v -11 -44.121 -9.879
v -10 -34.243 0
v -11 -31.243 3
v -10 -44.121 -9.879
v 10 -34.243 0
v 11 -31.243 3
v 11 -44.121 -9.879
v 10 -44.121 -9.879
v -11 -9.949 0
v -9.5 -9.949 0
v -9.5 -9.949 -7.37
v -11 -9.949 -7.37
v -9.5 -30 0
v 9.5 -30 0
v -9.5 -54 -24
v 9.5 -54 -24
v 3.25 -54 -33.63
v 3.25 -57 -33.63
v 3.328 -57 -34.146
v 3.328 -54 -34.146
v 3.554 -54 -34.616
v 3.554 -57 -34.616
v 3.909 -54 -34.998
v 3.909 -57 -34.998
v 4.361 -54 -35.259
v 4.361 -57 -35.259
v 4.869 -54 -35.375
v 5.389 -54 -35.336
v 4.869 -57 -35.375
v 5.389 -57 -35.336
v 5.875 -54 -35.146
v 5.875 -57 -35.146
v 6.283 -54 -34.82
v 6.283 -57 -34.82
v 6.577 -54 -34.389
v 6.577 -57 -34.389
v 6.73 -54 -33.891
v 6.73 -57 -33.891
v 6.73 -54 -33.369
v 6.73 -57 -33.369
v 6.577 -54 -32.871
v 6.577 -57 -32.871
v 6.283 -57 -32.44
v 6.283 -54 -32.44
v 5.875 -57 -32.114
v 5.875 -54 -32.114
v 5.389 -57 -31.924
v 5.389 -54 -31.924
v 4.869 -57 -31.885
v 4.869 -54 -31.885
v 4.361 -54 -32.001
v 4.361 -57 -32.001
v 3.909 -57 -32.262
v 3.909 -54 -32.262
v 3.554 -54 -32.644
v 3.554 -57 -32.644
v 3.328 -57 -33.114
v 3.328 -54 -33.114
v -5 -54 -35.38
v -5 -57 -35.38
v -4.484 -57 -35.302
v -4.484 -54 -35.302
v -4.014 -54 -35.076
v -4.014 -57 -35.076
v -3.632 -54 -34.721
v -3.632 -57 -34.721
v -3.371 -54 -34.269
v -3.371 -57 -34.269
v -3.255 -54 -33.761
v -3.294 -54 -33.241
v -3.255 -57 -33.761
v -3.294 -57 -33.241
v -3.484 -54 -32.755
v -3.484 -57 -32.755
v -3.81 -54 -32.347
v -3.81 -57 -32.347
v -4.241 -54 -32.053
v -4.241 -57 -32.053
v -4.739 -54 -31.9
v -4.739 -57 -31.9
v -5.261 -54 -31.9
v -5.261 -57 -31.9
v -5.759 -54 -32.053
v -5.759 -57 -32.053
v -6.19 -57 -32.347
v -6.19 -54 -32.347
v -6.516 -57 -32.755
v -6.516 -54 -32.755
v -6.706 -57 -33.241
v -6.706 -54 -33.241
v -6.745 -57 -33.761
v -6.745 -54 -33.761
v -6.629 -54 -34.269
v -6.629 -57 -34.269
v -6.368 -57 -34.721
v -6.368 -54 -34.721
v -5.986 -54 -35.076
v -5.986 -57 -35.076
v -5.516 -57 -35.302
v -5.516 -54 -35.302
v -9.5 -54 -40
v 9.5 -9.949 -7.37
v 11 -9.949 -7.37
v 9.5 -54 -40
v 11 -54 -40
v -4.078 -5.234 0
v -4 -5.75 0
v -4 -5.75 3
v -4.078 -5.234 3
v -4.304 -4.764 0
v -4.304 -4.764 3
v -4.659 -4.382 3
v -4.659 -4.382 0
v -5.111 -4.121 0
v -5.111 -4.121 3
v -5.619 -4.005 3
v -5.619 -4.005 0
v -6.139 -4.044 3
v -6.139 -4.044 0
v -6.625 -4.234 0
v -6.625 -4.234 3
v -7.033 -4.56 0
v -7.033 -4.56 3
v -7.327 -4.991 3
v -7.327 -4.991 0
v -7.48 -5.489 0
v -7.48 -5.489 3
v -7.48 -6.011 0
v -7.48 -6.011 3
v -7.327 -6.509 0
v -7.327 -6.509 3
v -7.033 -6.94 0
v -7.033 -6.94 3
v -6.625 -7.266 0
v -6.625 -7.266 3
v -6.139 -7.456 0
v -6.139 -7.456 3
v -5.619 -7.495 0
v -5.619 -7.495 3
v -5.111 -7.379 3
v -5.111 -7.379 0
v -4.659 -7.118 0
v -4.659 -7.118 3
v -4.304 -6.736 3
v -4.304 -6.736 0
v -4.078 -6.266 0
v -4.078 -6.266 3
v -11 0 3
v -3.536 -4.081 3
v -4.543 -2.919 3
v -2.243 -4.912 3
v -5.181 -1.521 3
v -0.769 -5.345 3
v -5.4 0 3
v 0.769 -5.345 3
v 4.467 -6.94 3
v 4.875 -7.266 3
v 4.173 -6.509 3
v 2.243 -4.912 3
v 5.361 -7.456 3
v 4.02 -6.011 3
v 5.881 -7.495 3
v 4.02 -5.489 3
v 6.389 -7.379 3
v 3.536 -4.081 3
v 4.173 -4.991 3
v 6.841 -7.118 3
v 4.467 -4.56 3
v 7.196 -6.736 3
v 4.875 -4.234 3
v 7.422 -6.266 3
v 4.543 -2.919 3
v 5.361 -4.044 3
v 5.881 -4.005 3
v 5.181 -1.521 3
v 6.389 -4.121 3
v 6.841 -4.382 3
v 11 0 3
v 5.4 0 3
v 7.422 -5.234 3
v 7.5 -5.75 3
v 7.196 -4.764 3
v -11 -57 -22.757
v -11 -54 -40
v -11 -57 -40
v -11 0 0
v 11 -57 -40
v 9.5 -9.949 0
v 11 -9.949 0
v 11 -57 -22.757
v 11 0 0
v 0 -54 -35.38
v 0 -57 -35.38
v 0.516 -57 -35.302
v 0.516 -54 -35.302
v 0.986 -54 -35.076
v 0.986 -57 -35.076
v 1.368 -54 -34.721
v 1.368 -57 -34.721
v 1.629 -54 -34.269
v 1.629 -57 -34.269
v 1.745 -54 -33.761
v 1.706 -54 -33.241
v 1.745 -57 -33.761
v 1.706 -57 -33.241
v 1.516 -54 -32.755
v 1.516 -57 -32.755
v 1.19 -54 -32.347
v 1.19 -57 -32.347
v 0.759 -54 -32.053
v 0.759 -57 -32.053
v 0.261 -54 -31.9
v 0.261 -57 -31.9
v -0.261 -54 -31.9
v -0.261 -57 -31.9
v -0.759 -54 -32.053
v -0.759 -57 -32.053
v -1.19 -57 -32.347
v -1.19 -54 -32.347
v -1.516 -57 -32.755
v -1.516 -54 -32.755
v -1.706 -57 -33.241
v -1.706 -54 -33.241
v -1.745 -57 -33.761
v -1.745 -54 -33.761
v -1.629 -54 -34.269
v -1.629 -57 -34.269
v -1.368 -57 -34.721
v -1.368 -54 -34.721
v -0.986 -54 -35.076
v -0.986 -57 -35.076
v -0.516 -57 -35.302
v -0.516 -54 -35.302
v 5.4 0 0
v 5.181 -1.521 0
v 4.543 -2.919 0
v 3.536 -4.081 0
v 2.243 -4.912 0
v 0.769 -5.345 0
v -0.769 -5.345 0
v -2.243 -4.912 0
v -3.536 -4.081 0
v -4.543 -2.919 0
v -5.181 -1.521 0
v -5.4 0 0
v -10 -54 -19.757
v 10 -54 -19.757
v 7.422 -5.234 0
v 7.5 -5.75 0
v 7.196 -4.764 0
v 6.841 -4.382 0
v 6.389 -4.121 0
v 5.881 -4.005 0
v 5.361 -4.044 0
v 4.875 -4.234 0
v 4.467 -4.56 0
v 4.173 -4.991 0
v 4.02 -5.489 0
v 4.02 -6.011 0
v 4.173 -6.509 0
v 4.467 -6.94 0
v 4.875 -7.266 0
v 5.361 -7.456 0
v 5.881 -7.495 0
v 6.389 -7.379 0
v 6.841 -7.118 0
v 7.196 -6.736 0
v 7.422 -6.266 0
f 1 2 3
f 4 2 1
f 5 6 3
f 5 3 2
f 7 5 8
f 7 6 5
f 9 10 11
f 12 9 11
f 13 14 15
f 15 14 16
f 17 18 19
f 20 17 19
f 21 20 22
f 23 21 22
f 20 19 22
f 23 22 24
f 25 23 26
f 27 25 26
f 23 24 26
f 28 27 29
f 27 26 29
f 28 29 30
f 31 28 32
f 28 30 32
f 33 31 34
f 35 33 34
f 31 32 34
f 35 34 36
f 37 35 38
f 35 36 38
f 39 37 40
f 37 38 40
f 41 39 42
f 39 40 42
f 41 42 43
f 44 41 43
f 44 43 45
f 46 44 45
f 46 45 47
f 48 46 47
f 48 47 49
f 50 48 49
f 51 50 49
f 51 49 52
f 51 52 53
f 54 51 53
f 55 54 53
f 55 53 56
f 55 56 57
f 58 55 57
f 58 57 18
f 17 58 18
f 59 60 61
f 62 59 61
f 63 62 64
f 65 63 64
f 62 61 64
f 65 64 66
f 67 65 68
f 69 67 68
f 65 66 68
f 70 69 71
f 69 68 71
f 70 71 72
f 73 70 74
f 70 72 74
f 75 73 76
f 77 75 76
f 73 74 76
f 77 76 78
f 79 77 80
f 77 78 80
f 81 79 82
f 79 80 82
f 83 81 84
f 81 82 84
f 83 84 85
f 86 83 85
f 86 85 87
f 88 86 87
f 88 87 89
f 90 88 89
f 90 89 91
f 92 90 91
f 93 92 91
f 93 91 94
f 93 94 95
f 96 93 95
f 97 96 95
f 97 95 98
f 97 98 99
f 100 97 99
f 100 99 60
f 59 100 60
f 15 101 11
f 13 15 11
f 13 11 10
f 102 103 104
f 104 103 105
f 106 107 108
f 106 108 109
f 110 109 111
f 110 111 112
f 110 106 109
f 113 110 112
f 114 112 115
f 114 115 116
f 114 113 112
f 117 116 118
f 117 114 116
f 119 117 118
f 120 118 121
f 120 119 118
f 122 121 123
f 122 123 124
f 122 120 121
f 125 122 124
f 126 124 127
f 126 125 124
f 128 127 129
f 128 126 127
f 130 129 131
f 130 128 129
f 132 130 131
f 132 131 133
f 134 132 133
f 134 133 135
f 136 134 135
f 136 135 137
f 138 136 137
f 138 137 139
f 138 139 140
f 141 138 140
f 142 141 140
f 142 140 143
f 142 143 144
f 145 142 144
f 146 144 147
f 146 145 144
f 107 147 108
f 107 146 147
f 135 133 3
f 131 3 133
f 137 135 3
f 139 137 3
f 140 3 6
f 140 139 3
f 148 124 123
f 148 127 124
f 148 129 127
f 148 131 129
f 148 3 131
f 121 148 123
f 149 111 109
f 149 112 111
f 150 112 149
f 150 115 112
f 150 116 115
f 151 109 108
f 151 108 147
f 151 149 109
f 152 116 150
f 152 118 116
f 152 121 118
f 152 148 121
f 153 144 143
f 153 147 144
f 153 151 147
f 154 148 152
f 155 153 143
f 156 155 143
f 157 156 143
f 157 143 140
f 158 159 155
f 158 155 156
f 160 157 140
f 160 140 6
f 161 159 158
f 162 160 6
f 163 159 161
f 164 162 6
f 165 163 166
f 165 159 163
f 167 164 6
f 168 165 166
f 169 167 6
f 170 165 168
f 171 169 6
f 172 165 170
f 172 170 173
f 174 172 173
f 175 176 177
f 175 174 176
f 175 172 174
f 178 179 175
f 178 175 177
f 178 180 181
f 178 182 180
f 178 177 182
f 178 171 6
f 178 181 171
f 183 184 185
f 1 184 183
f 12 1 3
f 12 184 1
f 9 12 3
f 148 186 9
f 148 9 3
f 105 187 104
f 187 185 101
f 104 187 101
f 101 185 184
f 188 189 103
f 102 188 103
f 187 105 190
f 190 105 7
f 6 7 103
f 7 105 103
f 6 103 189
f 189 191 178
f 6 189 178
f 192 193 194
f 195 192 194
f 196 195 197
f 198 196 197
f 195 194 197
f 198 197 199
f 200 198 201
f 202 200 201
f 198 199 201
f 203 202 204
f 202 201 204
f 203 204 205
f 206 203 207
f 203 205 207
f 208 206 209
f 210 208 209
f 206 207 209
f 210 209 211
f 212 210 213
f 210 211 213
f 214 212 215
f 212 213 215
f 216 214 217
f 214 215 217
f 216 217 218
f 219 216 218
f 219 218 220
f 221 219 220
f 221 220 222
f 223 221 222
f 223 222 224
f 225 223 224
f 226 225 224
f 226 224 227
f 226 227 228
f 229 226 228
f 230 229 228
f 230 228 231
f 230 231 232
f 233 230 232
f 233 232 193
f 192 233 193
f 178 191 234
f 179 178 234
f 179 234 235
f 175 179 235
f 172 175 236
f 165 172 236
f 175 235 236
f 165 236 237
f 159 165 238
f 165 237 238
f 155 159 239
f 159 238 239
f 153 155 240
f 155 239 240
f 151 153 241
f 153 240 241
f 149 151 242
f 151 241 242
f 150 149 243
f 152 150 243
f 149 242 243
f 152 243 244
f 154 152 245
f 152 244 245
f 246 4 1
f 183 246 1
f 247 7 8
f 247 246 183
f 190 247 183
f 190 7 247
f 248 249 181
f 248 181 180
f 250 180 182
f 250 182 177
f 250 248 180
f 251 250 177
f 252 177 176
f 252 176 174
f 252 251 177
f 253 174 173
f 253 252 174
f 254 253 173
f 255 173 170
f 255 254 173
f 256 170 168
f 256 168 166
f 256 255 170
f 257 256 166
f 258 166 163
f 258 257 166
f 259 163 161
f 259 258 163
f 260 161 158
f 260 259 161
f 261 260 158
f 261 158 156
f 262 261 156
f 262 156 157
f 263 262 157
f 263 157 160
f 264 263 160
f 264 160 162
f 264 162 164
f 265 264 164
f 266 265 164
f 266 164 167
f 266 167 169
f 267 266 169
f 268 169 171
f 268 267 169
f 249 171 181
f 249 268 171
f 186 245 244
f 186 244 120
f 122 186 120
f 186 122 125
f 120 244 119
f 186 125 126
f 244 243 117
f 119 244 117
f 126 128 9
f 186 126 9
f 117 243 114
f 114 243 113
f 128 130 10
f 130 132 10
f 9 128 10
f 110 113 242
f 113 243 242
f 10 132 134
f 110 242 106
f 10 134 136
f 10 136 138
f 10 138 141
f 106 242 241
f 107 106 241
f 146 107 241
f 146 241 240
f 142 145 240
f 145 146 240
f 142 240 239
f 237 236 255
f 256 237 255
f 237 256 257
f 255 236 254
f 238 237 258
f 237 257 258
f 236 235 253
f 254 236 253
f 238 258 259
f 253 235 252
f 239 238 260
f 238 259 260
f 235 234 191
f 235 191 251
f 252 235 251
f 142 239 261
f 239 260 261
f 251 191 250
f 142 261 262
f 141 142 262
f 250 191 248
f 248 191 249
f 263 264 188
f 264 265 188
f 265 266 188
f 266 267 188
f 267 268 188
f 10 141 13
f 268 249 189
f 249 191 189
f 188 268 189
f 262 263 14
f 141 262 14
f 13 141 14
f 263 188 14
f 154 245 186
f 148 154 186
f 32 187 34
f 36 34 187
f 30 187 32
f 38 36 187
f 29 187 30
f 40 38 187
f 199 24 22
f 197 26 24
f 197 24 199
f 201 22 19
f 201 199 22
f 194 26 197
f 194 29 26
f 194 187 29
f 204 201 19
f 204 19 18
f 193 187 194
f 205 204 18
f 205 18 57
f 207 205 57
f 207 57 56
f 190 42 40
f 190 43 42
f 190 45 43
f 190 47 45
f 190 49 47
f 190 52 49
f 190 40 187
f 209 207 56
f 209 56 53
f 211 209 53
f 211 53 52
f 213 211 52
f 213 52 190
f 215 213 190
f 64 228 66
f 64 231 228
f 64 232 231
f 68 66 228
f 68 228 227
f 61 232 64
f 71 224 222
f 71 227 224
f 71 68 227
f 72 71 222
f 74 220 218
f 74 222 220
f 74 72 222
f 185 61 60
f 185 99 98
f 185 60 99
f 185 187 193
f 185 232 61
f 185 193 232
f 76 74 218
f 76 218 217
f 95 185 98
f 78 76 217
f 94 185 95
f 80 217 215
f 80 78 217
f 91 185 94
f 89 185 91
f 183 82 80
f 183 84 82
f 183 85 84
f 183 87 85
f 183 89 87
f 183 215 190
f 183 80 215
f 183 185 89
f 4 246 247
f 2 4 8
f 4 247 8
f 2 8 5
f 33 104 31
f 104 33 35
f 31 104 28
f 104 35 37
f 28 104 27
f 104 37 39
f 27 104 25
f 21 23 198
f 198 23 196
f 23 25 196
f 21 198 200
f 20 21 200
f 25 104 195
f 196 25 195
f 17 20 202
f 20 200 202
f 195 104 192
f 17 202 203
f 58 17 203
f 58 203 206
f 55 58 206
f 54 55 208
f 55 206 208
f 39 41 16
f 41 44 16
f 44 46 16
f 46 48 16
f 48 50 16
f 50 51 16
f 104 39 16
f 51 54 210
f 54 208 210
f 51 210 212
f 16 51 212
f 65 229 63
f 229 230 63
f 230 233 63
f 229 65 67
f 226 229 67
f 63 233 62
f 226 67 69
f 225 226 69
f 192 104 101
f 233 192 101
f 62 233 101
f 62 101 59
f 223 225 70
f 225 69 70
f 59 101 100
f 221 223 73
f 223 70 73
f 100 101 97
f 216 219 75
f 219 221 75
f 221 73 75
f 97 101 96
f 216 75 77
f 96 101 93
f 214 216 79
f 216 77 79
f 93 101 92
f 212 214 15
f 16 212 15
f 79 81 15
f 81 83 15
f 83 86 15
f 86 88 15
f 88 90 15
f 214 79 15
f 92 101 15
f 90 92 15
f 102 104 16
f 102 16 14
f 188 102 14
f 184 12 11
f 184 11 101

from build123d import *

# Parameters (mm, degrees)
SKETCH1_R               = 1.75
BOSS_EXTRUDE1_DEPTH     = 3
BOSS_EXTRUDE2_DEPTH     = 3
SKETCH4_W               = 40
SKETCH4_H               = 3
BOSS_EXTRUDE3_DEPTH     = 22
SKETCH5_R               = 1.75
CUT_EXTRUDE1_DEPTH      = 10
BOSS_EXTRUDE4_DEPTH     = 1
BOSS_EXTRUDE5_DEPTH     = 22
CUT_EXTRUDE2_DEPTH      = 74.027392121
CUT_EXTRUDE3_DEPTH      = 71.498226928
SKETCH10_R              = 1.75
CUT_EXTRUDE4_DEPTH      = 71.498226928
BOSS_EXTRUDE6_DEPTH     = 1.5
CUT_EXTRUDE5_DEPTH      = 73.589599806
CUT_EXTRUDE5_DEPTH_BACK = 73.589599806


# Read off the part's stored shape, not the designer's step: Boss-Extrude2
with BuildPart() as part:
    # Sketch1 → Boss-Extrude1 (new body)
    with BuildSketch(Plane.XY):
        with BuildLine():
            Line((5.4, 4.03535718), (5.4, 0))
            ThreePointArc((5.4, 0), (0, -5.4), (-5.4, 0))
            Line((-5.4, 0), (-5.4, 4.03535718))
            ThreePointArc((-5.4, 4.03535718), (-7.5, 5.75), (-5.4, 7.46464282))
            Line((-5.4, 7.46464282), (-5.4, 9.583318841))
            ThreePointArc((-5.4, 9.583318841), (0, -11), (5.4, 9.583318841))
            Line((5.4, 9.583318841), (5.4, 7.46464282))
            ThreePointArc((5.4, 7.46464282), (6.856797181, 7.105544171), (7.5, 5.75))
            ThreePointArc((7.5, 5.75), (6.856797181, 4.394455829), (5.4, 4.03535718))
        make_face()
        with Locations((-5.75, -5.75)):
            Circle(SKETCH1_R, mode=Mode.SUBTRACT)
        with Locations((5.75, -5.75)):
            Circle(SKETCH1_R, mode=Mode.SUBTRACT)
    extrude(amount=BOSS_EXTRUDE1_DEPTH)

    # Boss-Extrude2 outline → Boss-Extrude2 (add)
    with BuildSketch(Plane.XY):
        with BuildLine():
            Line((-11, 0), (-11, -57))
            Line((-11, -57), (11, -57))
            Line((11, -57), (11, 0))
            ThreePointArc((11, 0), (0, -11), (-11, 0))
        make_face()
    extrude(amount=BOSS_EXTRUDE2_DEPTH)

    # Sketch4 → Boss-Extrude3 (add)
    with BuildSketch(Plane.ZY.offset(11)):
        with Locations((-20, -55.5)):
            Rectangle(SKETCH4_W, SKETCH4_H)
    extrude(amount=-BOSS_EXTRUDE3_DEPTH)

    # Sketch5 → Cut-Extrude1 (cut)
    with BuildSketch(Plane(origin=(0, -57, 0), x_dir=(-1, 0, 0), z_dir=(0, -1, 0))):
        with Locations(Location((0, 33.63, 0), (0, 0, 90))):
            Circle(SKETCH5_R)
    extrude(amount=-CUT_EXTRUDE1_DEPTH, mode=Mode.SUBTRACT)

    # Sketch6 → Boss-Extrude4 (add)
    with BuildSketch(Plane.ZY.offset(11)):
        Polygon((-20, -54), (0, -34), (0, -54), align=None)
    boss_extrude4 = extrude(amount=-BOSS_EXTRUDE4_DEPTH)

    # Mirror1: Boss-Extrude4 across plane
    add(boss_extrude4.mirror(Plane(origin=(0, 0, 0), x_dir=(0, 0, 1), z_dir=(1, 0, 0))))

    # Sketch7 → Boss-Extrude5 (add, through all)
    with BuildSketch(Plane(origin=(11, 0, 0), x_dir=(0, 0, -1), z_dir=(1, 0, 0))):
        Polygon((0, -30), (24, -54), (19.757359313, -54), (0, -34.242640687), align=None)
    extrude(amount=-BOSS_EXTRUDE5_DEPTH)

    # Sketch8 → Cut-Extrude2 (cut, through all)
    with BuildSketch(Plane(origin=(11, 0, 0), x_dir=(0, 0, -1), z_dir=(1, 0, 0))):
        Polygon((9.878679656, -44.121320344), (22.757359313, -57), (-3, -57), (-3, -31.242640687), align=None)
    extrude(amount=-CUT_EXTRUDE2_DEPTH, mode=Mode.SUBTRACT)

    # Sketch9 → Cut-Extrude3 (cut, through all)
    with BuildSketch(Plane(origin=(0, 0, 0), x_dir=(-1, 0, 0), z_dir=(0, 0, -1))):
        Polygon((-5.4, 0), (-11, 0), (-11, 9.583318841), (11, 9.583318841), (11, 0), align=None)
    extrude(amount=-CUT_EXTRUDE3_DEPTH, mode=Mode.SUBTRACT)

    # Sketch10 → Cut-Extrude4 (cut, through all)
    with BuildSketch(Plane(origin=(0, -57, 0), x_dir=(-1, 0, 0), z_dir=(0, -1, 0))):
        with Locations(Location((5, 33.63, 0), (0, 0, 90))):
            Circle(SKETCH10_R)
        with Locations((-5, 33.63)):
            Circle(SKETCH10_R)
    extrude(amount=-CUT_EXTRUDE4_DEPTH, mode=Mode.SUBTRACT)

    # Sketch11 → Boss-Extrude6 (add)
    with BuildSketch(Plane(origin=(11, 0, 0), x_dir=(0, 0, -1), z_dir=(1, 0, 0))):
        Polygon((0, 0), (40, -54), (40, -57), (22.757359313, -57), (-3, -31.242640687), (-3, 0), align=None)
    boss_extrude6 = extrude(amount=-BOSS_EXTRUDE6_DEPTH)

    # Mirror2: Boss-Extrude6 across plane
    add(boss_extrude6.mirror(Plane(origin=(0, 0, 0), x_dir=(0, 0, 1), z_dir=(1, 0, 0))))

    # Sketch12 → Cut-Extrude5 (cut, two sides: drawn at the far end of the back side and taken through both)
    with BuildSketch(Plane.ZY.offset(-9.5).offset(-CUT_EXTRUDE5_DEPTH_BACK)):
        Polygon((0, 0), (0, -9.949403651), (-10.711431508, -9.949403651), (-10.711431508, 0.731169273), align=None)
    extrude(amount=CUT_EXTRUDE5_DEPTH + CUT_EXTRUDE5_DEPTH_BACK, mode=Mode.SUBTRACT)


solid = part.part
